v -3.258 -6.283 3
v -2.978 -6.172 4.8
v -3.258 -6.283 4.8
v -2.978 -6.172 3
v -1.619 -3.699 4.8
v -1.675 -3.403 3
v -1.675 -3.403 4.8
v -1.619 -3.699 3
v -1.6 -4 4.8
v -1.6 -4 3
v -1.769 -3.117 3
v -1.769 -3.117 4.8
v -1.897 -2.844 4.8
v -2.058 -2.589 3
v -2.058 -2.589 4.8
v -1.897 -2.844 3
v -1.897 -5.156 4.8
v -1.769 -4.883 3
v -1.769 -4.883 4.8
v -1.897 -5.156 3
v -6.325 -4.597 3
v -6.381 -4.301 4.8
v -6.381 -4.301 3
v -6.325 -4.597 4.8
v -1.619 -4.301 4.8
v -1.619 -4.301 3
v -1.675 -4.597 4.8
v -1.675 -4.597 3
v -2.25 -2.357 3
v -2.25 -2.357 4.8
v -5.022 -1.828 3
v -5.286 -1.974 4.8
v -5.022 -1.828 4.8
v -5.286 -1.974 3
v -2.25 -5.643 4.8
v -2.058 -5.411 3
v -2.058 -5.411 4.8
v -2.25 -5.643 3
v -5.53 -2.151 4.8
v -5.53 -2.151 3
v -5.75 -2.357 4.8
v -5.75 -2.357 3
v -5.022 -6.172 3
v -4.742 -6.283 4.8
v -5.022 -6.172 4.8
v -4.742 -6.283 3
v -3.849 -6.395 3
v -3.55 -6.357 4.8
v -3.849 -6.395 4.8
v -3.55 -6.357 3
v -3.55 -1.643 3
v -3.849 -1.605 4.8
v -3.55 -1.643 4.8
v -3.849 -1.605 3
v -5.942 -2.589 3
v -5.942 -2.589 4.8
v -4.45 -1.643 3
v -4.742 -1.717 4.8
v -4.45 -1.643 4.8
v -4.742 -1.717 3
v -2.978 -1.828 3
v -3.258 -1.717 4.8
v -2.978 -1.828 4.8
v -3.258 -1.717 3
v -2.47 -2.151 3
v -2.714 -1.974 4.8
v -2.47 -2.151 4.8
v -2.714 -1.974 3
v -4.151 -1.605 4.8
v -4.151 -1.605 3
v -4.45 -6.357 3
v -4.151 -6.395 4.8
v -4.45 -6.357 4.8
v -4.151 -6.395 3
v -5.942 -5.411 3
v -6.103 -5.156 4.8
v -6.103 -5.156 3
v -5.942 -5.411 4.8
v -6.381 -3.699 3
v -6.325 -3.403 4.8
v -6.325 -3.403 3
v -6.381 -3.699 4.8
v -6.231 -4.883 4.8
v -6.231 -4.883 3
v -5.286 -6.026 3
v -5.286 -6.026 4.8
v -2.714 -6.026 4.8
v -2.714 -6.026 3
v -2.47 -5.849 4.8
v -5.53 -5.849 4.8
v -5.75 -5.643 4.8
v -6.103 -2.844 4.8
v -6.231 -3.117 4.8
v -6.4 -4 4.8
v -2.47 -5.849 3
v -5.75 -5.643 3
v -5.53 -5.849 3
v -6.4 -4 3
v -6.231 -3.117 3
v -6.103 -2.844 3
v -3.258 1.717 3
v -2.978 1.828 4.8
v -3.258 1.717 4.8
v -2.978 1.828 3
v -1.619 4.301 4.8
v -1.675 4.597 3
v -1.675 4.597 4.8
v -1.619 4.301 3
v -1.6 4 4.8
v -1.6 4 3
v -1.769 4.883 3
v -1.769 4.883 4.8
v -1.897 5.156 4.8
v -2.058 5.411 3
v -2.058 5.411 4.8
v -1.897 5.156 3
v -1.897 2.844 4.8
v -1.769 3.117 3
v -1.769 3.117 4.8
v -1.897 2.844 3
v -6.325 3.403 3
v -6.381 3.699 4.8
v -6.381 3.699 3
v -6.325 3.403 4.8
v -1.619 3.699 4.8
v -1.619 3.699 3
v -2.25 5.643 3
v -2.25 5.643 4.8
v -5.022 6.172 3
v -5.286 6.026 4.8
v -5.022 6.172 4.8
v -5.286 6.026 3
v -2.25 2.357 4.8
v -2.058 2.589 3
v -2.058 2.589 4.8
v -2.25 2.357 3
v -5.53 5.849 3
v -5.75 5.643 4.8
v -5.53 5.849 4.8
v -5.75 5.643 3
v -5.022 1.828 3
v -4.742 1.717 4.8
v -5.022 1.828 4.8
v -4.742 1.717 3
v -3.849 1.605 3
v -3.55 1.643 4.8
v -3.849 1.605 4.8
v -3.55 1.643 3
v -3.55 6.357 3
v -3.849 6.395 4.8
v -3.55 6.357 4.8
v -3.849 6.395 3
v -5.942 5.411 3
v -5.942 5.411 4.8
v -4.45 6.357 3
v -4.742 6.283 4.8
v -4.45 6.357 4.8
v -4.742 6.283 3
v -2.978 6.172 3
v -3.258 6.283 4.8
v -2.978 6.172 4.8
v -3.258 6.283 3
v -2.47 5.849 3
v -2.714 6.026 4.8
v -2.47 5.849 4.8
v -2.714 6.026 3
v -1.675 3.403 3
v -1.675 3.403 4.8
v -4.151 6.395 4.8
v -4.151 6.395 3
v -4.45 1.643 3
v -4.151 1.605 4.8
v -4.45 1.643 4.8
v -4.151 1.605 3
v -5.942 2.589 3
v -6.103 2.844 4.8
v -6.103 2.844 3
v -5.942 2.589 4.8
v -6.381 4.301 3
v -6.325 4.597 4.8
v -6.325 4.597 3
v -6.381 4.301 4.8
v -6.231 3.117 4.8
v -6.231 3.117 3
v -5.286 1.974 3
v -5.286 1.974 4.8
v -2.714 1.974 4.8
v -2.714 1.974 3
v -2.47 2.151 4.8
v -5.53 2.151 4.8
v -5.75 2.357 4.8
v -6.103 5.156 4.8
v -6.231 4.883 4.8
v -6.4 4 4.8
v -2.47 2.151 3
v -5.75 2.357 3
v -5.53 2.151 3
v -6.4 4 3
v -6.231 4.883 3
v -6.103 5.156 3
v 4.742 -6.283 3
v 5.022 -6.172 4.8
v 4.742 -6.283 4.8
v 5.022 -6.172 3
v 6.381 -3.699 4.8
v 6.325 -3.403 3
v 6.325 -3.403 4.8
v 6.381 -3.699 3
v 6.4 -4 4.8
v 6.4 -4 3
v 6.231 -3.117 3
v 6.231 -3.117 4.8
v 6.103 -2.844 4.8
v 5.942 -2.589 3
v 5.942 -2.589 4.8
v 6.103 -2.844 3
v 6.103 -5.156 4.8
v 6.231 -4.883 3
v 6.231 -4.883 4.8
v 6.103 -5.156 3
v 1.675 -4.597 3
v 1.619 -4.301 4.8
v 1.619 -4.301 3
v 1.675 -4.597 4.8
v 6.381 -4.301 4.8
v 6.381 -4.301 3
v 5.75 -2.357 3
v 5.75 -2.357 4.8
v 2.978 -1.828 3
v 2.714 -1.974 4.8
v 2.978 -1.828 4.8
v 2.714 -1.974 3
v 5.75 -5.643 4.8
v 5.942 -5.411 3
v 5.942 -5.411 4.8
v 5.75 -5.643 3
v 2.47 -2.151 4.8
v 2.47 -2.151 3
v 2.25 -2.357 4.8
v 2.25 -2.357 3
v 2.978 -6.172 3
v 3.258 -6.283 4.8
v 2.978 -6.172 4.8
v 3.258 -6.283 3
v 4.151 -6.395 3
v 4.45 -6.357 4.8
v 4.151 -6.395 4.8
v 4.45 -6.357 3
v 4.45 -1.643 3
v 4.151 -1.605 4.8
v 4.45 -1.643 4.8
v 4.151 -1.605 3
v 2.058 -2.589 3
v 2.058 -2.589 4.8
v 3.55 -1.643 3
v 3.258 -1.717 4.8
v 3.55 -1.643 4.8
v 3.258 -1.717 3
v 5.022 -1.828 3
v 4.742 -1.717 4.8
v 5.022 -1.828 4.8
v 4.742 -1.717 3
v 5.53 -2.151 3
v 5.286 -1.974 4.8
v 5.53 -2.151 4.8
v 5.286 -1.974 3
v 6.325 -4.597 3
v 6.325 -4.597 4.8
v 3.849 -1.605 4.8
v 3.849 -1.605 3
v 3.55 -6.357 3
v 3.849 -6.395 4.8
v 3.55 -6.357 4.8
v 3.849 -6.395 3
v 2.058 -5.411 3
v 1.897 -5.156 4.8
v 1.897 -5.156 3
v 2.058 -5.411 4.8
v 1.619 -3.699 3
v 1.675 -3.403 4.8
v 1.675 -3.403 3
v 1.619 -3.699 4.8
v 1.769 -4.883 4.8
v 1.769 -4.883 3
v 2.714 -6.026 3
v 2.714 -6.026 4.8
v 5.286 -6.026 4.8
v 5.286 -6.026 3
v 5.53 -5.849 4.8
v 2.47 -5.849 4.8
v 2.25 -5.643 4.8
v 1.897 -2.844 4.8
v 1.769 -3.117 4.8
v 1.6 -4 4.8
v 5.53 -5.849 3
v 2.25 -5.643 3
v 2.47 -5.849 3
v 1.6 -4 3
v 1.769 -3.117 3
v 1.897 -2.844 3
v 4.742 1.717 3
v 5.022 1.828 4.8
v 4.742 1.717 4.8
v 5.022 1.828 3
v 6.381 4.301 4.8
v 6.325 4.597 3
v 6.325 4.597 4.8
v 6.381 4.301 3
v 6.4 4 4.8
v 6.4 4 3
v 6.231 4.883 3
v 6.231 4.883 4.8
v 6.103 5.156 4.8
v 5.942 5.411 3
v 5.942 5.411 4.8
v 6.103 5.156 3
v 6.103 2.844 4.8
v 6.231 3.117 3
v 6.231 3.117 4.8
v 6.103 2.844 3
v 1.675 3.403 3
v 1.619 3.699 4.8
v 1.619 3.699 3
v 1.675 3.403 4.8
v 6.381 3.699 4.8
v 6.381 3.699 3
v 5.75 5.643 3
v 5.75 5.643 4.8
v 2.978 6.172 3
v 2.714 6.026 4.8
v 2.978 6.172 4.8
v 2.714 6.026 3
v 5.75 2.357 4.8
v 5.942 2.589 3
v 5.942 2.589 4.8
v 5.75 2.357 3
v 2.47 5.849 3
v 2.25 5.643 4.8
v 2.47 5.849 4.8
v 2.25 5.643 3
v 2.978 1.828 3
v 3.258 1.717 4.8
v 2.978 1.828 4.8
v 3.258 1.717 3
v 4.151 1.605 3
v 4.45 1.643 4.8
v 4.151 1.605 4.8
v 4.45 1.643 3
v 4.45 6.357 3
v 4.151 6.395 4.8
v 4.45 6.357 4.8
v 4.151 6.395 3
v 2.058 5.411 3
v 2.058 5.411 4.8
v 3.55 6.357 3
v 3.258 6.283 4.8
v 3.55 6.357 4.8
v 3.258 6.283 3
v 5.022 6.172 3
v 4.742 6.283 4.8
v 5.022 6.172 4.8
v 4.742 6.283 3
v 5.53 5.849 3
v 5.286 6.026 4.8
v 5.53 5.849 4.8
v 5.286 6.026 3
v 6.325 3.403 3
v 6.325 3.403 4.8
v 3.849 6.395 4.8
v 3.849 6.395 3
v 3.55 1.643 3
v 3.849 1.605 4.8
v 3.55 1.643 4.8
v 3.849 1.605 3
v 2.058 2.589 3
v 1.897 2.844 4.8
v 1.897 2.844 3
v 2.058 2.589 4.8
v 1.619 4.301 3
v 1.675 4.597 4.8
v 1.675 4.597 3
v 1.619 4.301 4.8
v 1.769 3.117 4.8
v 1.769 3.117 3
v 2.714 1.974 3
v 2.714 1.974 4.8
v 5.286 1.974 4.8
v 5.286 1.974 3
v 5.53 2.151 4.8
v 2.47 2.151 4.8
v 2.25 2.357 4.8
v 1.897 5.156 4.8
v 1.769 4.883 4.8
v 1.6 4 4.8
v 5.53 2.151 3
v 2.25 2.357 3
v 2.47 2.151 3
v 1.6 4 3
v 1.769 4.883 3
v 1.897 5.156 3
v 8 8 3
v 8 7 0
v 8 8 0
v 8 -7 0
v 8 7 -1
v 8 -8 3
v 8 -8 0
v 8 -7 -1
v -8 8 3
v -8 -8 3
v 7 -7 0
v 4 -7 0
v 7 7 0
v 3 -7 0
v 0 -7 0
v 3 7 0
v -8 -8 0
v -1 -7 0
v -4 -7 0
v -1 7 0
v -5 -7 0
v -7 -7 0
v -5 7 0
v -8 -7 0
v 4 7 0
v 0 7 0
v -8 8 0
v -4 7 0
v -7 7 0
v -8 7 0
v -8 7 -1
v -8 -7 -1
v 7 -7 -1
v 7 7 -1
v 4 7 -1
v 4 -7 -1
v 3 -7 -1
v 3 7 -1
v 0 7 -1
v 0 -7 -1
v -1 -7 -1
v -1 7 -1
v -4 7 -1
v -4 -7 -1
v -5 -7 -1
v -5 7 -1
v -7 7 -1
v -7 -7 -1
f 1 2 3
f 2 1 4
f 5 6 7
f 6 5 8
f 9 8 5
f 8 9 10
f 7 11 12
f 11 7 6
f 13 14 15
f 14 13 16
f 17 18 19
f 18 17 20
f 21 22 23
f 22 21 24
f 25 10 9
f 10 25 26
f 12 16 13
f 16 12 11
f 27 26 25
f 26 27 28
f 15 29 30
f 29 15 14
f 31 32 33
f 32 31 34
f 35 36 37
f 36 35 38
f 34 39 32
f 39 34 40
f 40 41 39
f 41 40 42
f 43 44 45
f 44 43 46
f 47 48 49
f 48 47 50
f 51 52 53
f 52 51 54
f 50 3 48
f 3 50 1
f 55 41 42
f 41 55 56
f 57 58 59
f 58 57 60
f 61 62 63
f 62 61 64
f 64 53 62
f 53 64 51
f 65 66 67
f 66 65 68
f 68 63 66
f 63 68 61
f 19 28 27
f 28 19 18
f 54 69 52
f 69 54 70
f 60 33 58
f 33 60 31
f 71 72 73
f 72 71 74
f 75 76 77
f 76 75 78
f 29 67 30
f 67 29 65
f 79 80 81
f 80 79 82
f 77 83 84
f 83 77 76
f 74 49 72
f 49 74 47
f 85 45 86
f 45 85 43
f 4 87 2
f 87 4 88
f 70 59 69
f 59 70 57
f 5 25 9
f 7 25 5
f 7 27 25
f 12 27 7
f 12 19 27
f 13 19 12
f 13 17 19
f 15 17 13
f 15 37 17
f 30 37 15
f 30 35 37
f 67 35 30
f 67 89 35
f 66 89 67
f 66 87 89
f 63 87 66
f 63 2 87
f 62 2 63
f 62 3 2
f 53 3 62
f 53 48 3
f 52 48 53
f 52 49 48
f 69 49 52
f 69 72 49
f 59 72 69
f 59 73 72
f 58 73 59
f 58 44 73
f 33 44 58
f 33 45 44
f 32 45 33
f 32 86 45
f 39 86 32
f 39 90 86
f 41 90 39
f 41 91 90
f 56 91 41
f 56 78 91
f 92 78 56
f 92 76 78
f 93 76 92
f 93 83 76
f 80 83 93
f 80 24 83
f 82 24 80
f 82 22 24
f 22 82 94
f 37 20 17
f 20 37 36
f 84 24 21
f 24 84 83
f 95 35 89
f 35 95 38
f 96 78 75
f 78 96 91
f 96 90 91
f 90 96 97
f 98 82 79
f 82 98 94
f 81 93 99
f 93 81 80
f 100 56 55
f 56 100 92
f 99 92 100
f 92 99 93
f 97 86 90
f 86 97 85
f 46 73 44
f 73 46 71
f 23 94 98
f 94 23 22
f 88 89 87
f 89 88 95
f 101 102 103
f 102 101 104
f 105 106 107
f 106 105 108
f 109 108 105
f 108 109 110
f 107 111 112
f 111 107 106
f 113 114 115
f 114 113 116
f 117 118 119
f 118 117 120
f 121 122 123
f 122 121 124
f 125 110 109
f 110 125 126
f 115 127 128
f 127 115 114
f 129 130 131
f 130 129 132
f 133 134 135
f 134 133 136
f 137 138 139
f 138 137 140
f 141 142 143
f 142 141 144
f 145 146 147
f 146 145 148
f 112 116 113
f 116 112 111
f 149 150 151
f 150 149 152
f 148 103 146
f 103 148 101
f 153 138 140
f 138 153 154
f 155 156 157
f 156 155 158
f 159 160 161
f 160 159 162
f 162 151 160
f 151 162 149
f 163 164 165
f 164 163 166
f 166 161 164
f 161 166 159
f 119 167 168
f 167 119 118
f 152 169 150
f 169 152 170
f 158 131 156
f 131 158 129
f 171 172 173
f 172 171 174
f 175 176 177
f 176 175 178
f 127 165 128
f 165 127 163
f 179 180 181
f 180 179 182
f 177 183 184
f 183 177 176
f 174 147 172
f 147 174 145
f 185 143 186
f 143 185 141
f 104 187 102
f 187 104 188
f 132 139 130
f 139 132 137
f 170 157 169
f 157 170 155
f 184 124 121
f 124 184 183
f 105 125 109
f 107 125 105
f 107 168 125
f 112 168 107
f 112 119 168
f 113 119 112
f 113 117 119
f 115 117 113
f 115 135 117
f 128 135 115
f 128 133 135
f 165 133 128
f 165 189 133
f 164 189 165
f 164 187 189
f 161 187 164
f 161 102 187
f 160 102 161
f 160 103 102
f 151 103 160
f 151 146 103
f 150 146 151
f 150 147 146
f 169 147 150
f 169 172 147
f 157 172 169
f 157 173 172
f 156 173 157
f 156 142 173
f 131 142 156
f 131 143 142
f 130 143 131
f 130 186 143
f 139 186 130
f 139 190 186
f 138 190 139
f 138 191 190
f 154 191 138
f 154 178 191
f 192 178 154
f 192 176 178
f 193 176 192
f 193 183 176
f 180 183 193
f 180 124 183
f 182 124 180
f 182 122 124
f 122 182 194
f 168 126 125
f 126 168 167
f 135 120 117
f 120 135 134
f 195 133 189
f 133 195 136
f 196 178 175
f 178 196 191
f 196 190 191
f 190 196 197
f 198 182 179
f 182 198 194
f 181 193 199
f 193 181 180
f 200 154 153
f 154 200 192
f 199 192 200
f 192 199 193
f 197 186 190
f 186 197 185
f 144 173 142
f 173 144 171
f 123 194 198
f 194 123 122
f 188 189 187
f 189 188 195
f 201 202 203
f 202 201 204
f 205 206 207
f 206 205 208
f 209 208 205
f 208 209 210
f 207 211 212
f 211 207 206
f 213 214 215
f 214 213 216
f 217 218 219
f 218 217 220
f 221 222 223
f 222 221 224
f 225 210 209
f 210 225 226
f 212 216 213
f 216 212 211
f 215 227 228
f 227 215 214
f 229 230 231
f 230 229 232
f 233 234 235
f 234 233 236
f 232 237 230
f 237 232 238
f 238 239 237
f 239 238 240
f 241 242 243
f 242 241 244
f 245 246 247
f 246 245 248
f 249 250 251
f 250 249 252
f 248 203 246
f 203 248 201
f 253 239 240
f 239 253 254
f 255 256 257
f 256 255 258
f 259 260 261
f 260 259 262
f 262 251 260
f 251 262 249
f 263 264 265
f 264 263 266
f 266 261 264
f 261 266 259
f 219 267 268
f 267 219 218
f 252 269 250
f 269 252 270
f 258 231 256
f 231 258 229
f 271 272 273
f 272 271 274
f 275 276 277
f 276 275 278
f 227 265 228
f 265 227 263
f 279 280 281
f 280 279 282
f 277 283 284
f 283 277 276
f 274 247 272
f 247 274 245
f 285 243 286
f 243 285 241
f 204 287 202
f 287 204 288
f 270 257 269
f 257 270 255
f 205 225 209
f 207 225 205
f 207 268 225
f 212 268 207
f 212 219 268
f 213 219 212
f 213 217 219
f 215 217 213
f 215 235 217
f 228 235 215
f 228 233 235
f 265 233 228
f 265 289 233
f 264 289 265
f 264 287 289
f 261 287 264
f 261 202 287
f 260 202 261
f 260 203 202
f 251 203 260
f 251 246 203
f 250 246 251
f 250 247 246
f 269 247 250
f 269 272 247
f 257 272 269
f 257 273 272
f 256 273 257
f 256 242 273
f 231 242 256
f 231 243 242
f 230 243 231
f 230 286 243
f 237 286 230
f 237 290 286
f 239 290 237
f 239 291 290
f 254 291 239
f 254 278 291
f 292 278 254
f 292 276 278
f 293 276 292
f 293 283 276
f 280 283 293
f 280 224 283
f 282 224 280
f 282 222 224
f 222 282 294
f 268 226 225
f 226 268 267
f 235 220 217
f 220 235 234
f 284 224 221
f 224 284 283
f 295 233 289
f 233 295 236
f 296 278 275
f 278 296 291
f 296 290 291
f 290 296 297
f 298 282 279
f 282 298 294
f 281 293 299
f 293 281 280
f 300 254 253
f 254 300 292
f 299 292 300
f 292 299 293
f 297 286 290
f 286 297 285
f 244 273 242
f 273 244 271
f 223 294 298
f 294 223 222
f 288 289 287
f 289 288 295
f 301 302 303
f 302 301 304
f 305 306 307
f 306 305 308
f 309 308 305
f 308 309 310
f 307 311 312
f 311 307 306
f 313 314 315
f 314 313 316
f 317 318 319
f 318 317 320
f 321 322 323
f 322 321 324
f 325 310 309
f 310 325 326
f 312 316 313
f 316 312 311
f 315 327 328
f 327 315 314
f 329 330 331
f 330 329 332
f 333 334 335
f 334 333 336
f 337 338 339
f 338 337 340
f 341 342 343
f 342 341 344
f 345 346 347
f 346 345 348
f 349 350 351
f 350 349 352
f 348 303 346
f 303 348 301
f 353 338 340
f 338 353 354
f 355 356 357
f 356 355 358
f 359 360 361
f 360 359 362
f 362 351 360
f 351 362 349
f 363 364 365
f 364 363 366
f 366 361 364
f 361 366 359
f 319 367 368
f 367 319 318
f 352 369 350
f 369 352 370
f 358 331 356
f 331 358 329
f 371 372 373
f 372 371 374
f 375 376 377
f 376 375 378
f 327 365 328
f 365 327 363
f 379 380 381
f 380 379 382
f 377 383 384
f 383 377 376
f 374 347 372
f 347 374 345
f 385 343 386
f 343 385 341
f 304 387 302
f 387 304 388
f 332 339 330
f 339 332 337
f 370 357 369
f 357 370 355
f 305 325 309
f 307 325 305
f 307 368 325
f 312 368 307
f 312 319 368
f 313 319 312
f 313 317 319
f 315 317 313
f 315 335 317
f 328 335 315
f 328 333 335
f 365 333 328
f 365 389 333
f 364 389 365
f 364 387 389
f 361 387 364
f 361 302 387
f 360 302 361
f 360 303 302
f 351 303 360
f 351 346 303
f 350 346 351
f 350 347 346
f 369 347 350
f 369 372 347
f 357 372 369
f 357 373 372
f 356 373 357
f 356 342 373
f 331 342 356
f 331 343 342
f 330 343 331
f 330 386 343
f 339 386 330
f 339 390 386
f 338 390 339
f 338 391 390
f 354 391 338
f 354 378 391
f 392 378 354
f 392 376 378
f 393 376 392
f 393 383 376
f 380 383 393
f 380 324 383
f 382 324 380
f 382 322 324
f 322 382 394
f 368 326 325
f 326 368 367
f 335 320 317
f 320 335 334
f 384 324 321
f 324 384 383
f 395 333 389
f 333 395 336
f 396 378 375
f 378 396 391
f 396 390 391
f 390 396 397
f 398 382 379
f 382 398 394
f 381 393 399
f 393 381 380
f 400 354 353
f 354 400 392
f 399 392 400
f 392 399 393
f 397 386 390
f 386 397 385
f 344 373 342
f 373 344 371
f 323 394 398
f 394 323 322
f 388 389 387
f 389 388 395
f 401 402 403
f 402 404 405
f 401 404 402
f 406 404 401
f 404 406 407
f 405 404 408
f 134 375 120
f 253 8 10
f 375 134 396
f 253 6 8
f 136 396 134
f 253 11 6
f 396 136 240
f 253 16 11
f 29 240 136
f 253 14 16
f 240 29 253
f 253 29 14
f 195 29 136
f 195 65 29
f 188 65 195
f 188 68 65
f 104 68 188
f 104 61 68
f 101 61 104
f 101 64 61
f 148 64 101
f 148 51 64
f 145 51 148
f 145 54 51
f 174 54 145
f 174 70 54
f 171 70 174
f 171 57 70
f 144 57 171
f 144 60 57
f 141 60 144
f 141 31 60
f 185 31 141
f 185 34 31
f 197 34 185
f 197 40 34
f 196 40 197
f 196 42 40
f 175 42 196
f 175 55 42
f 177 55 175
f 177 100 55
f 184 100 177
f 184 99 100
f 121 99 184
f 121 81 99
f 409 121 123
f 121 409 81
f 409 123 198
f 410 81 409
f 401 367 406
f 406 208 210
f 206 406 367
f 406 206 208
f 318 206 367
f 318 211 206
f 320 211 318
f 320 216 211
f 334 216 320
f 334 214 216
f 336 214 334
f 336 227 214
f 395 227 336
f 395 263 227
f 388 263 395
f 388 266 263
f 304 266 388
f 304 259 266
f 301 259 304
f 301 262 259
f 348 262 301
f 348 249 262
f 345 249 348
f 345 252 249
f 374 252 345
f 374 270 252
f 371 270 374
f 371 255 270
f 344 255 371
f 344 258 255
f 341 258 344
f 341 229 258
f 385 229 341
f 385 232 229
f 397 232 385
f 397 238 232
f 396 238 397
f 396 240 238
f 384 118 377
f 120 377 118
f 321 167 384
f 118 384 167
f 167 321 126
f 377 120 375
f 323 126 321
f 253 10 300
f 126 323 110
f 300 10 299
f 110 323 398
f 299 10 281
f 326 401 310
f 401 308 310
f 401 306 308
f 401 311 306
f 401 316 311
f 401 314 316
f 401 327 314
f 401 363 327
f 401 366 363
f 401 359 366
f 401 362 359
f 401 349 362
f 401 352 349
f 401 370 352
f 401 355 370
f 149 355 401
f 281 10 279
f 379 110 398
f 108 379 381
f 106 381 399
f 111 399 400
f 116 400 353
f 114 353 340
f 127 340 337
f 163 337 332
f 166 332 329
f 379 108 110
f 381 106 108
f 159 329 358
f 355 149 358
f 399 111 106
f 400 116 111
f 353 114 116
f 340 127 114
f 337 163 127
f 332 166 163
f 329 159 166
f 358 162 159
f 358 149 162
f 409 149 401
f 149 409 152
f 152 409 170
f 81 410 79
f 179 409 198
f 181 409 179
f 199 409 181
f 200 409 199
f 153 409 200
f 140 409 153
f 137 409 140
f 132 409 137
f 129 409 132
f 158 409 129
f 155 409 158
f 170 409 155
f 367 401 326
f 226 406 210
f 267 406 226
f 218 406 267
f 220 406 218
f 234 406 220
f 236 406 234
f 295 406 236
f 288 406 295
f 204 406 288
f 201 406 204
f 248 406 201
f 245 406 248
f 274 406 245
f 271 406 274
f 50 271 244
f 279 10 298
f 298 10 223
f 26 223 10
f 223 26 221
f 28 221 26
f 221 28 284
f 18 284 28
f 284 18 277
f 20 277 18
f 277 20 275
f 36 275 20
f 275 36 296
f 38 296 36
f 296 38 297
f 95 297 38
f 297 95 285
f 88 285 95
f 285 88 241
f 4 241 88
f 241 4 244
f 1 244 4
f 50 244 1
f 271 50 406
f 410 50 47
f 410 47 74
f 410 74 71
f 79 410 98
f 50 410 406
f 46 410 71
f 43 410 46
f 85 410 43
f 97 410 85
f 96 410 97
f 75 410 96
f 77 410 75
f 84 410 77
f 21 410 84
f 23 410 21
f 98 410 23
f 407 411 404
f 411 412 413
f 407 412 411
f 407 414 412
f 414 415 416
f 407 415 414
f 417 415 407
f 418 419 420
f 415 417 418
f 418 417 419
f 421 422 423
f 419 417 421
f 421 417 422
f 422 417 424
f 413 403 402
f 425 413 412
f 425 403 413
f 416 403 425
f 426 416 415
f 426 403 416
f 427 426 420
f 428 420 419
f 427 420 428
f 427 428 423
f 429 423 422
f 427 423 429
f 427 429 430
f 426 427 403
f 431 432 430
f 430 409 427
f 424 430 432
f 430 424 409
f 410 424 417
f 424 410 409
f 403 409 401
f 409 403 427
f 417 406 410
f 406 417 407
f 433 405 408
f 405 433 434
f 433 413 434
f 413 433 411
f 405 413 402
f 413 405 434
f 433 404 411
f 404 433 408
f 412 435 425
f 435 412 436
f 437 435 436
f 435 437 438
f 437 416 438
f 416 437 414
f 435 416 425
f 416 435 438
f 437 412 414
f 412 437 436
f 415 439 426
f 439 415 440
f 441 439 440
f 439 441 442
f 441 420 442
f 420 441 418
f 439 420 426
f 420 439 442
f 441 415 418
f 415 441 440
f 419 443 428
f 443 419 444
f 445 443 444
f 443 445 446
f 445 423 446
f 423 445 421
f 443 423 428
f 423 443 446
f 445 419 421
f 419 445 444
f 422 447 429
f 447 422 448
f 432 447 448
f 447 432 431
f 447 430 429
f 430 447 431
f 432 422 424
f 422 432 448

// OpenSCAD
// file: Lego Modular.scad
rounded_p = false;

brick_h = 9.6;
unit = 8;
bump_h = 1.8;
bump_r = 2.4;
wall = 1.5;
cyl_wall = 1;
top_depth = 1.5;
cyl_r = (unit * sqrt(2) - 2 * bump_r) / 2;

gap = 0;  // this is wrong -- makes the base gaps smaller, not larger
gaps = 2 * gap;

module brick(bumps_x, bumps_y, height = 1, shallow_p = 0) {
    l = unit * bumps_x - gaps;
    w = unit * bumps_y - gaps;
    h = height * brick_h;
    
    h_offset = ( shallow_p == 0 ) ? -top_depth : (1.2 * bump_h + gaps - h);

    difference() {
        // outside box
        translate([-l / 2, -w / 2 ,0]) {
            cube([l, w, h]);
        }
        
        // inside cut
        translate([
            -(l - gaps - 2 * wall) / 2,
            -(w - gaps - 2 * wall) / 2,
            h_offset
        ]) {
            cube([
                l - gaps - 2 * wall,
                w - gaps - 2 * wall,
                h
            ]);
        }
    }
}

module bumps(bumps_x, bumps_y) {
    translate([(-1 - bumps_x) * unit / 2, (-1 - bumps_y) * unit / 2, 0])
        for (x = [1 : bumps_x], y = [1 : bumps_y]) {
            translate([x * unit, y * unit, 0]) {
                intersection() {
                    cylinder(r = bump_r, h = bump_h + top_depth / 2);
                    if ( rounded_p ) {
                        sphere(bump_h + top_depth);
                    }
                }
            }
        }
}

module base(bumps_x, bumps_y, height = 1, shallow_p = 0) {
    h = shallow_p ? (1.5*bump_h + gaps + cyl_wall) : ((height * brick_h) - top_depth);

   	if (bumps_x > 1 && bumps_y > 1) {
		translate([
			(-bumps_x) * unit / 2,
			(-bumps_y) * unit / 2,
			0
		]) {
			for (x = [1 : bumps_x - 1], y = [1 : bumps_y - 1]) {
				translate([x * unit, y * unit, 0]) {
					difference() {
						cylinder(r = cyl_r, h = h + 0.02);
						translate([0, 0, -1 - cyl_wall]) {
							cylinder(r = cyl_r - cyl_wall, h = h + 1);
						}
					}
				}
			}
		}
	}
}

module lego(bumps_x, bumps_y, height = 1, shallow_p = 0) {
    brick(bumps_x, bumps_y, height, shallow_p);

    translate([0, 0, (brick_h * height) - top_depth / 2	])
        bumps(bumps_x, bumps_y);

    base(bumps_x, bumps_y, height, shallow_p);
}

//lego(6, 2, shallow_p = 0, height = 2);
// main file
include <Lego Modular.scad>

$fn = 50;

union() {
    translate([0, 0, 1.5]) cube([16, 16, 3], center = true);
    translate([0, 0, 2.25]) bumps(2,2);
    translate([7, -7, -1]) cube([1, 14, 1.1]);
    translate([3, -7, -1]) cube([1, 14, 1.1]);
    translate([-1, -7, -1]) cube([1, 14, 1.1]);
    translate([-5, -7, -1]) cube([1, 14, 1.1]);
    translate([-8, -7, -1]) cube([1, 14, 1.1]);
}
